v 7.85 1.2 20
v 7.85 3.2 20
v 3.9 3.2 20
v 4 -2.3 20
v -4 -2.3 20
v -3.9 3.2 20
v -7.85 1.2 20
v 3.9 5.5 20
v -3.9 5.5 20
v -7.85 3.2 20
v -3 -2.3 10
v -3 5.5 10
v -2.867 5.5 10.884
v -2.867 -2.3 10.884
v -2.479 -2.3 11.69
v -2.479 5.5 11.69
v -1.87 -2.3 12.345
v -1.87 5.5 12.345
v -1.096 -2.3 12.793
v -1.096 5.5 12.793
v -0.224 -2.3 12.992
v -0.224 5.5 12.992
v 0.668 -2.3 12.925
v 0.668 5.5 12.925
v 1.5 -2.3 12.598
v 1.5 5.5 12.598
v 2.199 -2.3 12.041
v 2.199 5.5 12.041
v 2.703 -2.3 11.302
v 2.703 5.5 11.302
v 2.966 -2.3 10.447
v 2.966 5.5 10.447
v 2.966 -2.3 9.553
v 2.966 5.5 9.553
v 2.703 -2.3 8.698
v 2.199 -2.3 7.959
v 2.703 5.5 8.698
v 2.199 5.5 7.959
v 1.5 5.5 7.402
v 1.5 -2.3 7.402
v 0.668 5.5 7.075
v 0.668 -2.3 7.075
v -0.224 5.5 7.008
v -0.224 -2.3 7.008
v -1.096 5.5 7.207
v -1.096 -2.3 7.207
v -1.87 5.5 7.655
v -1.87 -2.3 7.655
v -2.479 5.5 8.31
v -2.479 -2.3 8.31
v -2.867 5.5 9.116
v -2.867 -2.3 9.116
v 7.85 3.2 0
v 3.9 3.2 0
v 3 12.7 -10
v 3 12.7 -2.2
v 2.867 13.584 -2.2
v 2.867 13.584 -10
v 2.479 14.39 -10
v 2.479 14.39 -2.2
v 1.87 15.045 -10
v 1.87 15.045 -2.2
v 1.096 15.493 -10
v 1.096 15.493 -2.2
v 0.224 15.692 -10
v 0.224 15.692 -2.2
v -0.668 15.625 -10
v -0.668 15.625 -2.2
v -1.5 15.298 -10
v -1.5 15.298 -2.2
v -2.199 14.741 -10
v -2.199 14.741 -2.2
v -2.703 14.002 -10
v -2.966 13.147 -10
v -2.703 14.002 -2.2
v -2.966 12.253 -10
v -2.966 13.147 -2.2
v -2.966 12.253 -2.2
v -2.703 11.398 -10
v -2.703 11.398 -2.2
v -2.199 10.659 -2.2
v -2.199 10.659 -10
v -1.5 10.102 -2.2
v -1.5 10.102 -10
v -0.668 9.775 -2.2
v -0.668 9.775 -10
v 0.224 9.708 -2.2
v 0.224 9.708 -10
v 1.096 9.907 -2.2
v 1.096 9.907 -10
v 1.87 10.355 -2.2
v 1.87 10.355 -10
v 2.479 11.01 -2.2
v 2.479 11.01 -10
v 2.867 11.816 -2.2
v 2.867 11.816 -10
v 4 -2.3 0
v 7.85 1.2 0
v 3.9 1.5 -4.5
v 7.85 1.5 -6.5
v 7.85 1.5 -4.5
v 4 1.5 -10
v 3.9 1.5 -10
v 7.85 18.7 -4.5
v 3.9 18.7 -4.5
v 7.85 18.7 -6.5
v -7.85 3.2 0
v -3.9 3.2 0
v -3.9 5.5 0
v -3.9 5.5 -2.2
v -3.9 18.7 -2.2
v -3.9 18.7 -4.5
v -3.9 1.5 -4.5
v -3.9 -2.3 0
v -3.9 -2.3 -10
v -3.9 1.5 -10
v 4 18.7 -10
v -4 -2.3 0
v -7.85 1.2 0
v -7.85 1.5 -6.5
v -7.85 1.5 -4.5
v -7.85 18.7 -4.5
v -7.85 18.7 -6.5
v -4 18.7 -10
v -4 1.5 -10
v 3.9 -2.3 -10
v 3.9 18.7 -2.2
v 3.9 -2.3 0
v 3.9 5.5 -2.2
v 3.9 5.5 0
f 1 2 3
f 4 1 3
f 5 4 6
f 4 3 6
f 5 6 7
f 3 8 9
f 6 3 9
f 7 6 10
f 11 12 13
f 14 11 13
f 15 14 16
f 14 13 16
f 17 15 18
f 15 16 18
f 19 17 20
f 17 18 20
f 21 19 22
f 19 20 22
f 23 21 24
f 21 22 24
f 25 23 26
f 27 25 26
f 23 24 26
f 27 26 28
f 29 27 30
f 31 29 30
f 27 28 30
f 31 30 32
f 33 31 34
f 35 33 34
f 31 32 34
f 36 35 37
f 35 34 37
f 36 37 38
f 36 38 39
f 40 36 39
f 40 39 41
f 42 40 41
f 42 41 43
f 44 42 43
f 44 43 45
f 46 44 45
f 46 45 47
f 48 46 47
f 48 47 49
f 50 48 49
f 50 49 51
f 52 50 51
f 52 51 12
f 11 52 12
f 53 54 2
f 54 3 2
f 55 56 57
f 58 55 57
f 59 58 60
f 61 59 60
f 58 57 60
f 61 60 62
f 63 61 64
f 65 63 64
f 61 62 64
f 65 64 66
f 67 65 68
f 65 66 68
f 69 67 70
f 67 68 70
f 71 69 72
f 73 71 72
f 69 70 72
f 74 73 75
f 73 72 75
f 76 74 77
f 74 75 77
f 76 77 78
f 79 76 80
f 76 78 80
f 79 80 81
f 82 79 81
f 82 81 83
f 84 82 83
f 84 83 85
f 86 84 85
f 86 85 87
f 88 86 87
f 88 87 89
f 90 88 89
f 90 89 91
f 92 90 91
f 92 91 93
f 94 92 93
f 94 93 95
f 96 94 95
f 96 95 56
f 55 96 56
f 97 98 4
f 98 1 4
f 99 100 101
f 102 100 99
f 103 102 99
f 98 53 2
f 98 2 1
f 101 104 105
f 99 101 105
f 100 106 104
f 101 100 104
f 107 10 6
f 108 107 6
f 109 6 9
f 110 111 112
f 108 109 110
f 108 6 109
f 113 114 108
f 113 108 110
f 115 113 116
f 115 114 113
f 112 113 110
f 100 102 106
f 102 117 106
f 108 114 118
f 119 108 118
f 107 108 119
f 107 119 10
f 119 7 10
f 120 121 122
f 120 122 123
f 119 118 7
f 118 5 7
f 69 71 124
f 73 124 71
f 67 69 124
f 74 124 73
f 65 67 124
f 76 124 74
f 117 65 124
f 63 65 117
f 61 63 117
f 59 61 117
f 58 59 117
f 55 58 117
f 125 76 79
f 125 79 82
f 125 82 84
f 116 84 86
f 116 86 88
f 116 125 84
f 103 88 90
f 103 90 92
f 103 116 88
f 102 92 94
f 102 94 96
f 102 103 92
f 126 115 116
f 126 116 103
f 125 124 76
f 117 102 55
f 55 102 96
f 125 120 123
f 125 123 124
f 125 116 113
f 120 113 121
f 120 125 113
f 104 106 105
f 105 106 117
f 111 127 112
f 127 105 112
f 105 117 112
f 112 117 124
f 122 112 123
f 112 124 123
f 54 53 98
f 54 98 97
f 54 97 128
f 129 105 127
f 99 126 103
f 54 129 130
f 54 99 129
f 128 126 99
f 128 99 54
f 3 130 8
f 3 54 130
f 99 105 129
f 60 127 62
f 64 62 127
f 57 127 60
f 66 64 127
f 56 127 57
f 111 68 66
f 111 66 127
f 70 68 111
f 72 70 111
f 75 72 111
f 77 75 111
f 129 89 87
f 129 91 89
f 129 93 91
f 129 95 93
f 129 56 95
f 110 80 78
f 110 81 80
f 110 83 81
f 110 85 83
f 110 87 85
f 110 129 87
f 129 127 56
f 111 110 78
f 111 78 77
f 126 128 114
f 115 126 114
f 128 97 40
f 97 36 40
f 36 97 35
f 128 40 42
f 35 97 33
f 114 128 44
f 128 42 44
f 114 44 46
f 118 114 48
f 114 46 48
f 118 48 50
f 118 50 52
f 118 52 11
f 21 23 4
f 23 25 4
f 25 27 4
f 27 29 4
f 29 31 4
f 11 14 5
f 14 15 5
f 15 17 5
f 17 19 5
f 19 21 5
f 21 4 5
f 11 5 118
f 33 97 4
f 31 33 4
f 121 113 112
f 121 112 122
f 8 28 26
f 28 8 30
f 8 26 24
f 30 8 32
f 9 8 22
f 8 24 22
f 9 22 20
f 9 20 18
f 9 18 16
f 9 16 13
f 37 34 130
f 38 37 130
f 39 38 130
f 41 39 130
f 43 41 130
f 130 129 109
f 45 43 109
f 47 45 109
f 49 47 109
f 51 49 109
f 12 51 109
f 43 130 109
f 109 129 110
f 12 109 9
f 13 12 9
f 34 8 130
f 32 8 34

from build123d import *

# Parameters (mm, degrees)
EXTRUDE_1_DEPTH      = 20
EXTRUDE_1_DEPTH_BACK = 0.0001
SKETCH_2_W           = 7.8
SKETCH_2_H           = 7.8
EXTRUDE_2_DEPTH      = 10
EXTRUDE_3_DEPTH      = 13.2
EXTRUDE_3_DEPTH_BACK = 4
SKETCH_4_R           = 3
CUT_EXTRUDE_1_DEPTH  = 11.615262649
SKETCH_5_R           = 3
CUT_EXTRUDE_2_DEPTH  = 8.8
SKETCH_6_W           = 7.8
SKETCH_6_H           = 2.815262649
CUT_EXTRUDE_3_DEPTH  = 21.0001


with BuildPart() as part:
    # Эскиз1 → Бобышка-Вытянуть1 (new body, two sides)
    with BuildSketch(Plane.XY) as extrude_1_sk:
        Polygon((-3.9, 8.315262649), (3.9, 8.315262649), (3.9, 3.2), (7.85, 3.2), (7.85, 1.2), (4, -2.3), (-4, -2.3), (-7.85, 1.2), (-7.85, 3.2), (-3.9, 3.2), align=None)
    extrude(amount=EXTRUDE_1_DEPTH)
    extrude(extrude_1_sk.sketch, amount=-EXTRUDE_1_DEPTH_BACK)

    # Эскиз2 → Бобышка-Вытянуть2 (add)
    with BuildSketch(Plane(origin=(0, 0, -0.0001), x_dir=(-1, 0, 0), z_dir=(0, 0, -1))):
        with Locations((0, 1.6)):
            Rectangle(SKETCH_2_W, SKETCH_2_H)
    extrude(amount=EXTRUDE_2_DEPTH)

    # Эскиз3 → Бобышка-Вытянуть3 (add, two sides)
    with BuildSketch(Plane(origin=(0, 5.5, 0), x_dir=(1, 0, 0), z_dir=(0, 1, 0))) as extrude_3_sk:
        Polygon((3.9, 2.2001), (-3.9, 2.2001), (-3.9, 4.5001), (-7.85, 4.5001), (-7.85, 6.5001), (-4, 10.0001), (4, 10.0001), (7.85, 6.5001), (7.85, 4.5001), (3.9, 4.5001), align=None)
    extrude(amount=EXTRUDE_3_DEPTH)
    extrude(extrude_3_sk.sketch, amount=-EXTRUDE_3_DEPTH_BACK)

    # Эскиз4 → Вырез-Вытянуть1 (cut, through all)
    with BuildSketch(Plane(origin=(0, 8.315262649, 0), x_dir=(1, 0, 0), z_dir=(0, 1, 0))):
        with Locations(Location((0, -10, 0), (0, 0, 180))):  # turned: the seam where the file's is
            Circle(SKETCH_4_R)
    extrude(amount=-CUT_EXTRUDE_1_DEPTH, mode=Mode.SUBTRACT)

    # Эскиз5 → Вырез-Вытянуть2 (cut, through all)
    with BuildSketch(Plane.XY.offset(-2.2001)):
        with Locations((0, 12.7)):
            Circle(SKETCH_5_R)
    extrude(amount=-CUT_EXTRUDE_2_DEPTH, mode=Mode.SUBTRACT)

    # Эскиз6 → Вырез-Вытянуть3 (cut, through all)
    with BuildSketch(Plane(origin=(0, 0, -0.0001), x_dir=(-1, 0, 0), z_dir=(0, 0, -1))):
        with Locations((0, 6.907631325)):
            Rectangle(SKETCH_6_W, SKETCH_6_H)
    extrude(amount=-CUT_EXTRUDE_3_DEPTH, mode=Mode.SUBTRACT)


solid = part.part
